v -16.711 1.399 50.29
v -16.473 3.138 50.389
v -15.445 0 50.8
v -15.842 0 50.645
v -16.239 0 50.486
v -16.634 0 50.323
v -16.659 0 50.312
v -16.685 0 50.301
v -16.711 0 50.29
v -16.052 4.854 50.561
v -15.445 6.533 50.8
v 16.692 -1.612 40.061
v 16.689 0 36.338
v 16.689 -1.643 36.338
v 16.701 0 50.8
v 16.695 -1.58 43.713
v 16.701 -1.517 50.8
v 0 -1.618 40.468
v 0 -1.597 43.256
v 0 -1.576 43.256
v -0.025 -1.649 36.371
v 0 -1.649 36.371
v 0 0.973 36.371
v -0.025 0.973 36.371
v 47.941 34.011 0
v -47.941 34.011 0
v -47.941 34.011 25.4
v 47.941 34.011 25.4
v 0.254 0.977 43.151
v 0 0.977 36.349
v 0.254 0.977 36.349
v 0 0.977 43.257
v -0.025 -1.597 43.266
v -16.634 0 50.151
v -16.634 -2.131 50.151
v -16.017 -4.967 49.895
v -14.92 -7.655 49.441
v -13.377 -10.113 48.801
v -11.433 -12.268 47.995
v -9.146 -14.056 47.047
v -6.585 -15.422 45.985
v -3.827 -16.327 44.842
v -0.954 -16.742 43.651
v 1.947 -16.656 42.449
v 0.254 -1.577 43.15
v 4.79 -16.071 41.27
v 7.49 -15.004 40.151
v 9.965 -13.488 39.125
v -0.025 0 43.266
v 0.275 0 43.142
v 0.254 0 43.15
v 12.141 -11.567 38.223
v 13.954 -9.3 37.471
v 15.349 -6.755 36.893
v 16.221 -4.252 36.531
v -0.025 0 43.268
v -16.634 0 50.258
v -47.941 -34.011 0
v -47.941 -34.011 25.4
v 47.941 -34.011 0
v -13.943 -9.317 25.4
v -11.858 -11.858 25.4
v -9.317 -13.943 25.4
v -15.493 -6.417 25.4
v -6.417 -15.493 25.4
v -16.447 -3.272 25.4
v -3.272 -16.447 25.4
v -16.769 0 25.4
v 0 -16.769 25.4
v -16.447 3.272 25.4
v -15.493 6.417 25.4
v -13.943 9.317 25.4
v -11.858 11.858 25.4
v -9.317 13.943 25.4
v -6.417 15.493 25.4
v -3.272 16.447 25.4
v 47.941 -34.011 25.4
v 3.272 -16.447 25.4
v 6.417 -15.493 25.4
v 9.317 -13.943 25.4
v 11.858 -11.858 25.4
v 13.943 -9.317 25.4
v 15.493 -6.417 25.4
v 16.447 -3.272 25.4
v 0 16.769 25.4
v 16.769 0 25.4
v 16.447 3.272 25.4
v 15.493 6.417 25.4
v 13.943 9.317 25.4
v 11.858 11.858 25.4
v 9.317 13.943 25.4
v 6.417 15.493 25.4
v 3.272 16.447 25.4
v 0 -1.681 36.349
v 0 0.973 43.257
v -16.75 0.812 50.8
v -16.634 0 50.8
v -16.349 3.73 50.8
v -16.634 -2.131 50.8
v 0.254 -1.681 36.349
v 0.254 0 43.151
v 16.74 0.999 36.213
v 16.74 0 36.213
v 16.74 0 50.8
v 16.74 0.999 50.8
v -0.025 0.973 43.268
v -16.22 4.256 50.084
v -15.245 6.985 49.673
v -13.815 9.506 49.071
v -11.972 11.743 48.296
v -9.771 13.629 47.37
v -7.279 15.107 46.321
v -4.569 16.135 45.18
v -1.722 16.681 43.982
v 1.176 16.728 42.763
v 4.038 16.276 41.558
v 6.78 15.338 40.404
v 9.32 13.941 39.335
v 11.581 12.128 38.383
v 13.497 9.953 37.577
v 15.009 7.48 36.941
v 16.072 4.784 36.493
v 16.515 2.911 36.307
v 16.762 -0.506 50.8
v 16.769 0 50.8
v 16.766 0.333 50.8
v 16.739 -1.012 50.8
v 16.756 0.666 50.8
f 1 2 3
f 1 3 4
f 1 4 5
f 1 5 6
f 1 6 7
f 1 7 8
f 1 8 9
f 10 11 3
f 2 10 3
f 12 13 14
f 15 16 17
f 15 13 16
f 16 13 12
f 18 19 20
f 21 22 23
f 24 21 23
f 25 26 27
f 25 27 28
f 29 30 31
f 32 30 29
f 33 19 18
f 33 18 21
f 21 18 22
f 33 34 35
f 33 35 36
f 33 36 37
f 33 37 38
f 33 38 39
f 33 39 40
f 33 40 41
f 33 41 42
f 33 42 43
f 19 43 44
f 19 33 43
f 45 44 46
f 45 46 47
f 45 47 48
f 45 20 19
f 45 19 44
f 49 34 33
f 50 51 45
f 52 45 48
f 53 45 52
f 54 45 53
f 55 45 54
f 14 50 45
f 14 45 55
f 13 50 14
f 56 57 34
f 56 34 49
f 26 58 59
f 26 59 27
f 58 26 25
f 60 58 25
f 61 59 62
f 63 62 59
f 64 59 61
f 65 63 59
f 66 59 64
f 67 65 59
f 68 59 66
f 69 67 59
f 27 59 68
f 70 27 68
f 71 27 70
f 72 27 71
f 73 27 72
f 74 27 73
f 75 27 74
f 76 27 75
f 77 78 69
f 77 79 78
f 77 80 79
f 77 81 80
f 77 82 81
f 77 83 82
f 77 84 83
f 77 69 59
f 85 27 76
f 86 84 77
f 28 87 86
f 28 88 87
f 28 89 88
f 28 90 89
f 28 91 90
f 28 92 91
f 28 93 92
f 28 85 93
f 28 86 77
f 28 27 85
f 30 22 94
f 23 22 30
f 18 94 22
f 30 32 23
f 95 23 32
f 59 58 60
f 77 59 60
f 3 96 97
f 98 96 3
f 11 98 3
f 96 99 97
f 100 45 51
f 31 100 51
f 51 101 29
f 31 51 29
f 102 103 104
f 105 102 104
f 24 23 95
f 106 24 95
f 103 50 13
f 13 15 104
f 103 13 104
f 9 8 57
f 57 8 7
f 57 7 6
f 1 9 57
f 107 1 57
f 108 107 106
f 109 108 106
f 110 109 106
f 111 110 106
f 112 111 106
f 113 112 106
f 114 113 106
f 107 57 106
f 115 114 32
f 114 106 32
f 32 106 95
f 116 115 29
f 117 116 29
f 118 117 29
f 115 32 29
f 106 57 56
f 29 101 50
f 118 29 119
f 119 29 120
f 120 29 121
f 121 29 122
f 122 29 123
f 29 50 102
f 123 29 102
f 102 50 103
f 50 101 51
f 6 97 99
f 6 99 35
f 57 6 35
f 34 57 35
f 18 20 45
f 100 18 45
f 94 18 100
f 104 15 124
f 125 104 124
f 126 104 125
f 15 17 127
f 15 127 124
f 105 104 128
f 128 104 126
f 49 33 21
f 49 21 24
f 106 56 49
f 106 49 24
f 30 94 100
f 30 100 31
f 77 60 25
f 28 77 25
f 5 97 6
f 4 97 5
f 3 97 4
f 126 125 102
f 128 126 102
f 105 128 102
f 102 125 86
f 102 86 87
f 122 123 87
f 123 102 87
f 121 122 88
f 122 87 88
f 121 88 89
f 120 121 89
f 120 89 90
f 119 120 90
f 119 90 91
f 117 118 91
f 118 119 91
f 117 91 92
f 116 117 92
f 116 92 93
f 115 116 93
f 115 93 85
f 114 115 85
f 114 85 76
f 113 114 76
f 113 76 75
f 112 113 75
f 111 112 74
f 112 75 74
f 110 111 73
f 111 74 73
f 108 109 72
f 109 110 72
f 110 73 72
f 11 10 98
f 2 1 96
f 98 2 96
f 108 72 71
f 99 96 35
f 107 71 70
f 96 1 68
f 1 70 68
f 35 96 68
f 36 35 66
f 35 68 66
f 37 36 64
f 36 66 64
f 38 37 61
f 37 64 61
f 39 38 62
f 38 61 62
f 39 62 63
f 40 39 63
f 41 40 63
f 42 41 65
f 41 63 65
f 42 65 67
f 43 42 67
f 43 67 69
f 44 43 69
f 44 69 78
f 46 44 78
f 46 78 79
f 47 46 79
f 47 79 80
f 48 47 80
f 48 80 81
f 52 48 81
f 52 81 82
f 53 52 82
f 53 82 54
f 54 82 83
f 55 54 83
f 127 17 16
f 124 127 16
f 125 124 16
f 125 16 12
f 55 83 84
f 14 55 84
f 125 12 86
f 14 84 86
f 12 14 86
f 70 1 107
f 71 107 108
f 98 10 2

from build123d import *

# Parameters (mm, degrees)
F0_W      = 95.881224
F0_H      = 68.022564
F0_R      = 16.769473
F1_DEPTH  = 25.4
F2_DEPTH  = 50.8
F4_DEPTH  = 25.4
F6_DEPTH  = 25.4
F8_DEPTH  = 0.254
F10_DEPTH = 0.0254


with BuildPart() as f1:
    # F0 (on Top) → F1 (new body)
    with BuildSketch(Plane.XY):
        Rectangle(F0_W, F0_H)
        Circle(F0_R, mode=Mode.SUBTRACT)
    extrude(amount=F1_DEPTH)

    # F0 (on Top) → F2 (join)
    with BuildSketch(Plane.XY):
        Circle(F0_R)
    extrude(amount=F2_DEPTH)

    # F3 (on Front) → F4 (cut)
    with BuildSketch(Plane.XZ):
        with BuildLine():
            ThreePointArc((16.7397, 50.897755), (-0.044019, 53.808078), (-16.71098, 50.290175))
            Line((-16.71098, 50.290175), (16.7397, 36.212575))
            Line((16.7397, 36.212575), (16.7397, 50.897755))
        make_face()
    extrude(amount=-F4_DEPTH, mode=Mode.SUBTRACT)

    # F5 (on Front) → F6 (cut)
    with BuildSketch(Plane.XZ):
        Polygon((-16.633531, 50.150838), (16.688788, 36.337622), (16.700679, 50.800726), (-16.633531, 50.828132), align=None)
    extrude(amount=F6_DEPTH, mode=Mode.SUBTRACT)

    # F7 (on Right) → F8 (cut)
    with BuildSketch(Plane.YZ):
        Polygon((-1.459569, 50.8672), (-1.681041, 36.348537), (0.976613, 36.348537), (0.976613, 50.8672), align=None)
    extrude(amount=F8_DEPTH, mode=Mode.SUBTRACT)

    # F9 (on Right) → F10 (cut)
    with BuildSketch(Plane.YZ):
        Polygon((-1.541382, 50.746284), (-1.648819, 36.371183), (0.972651, 36.371183), (0.972651, 50.746284), align=None)
    extrude(amount=-F10_DEPTH, mode=Mode.SUBTRACT)


solid = f1.part
